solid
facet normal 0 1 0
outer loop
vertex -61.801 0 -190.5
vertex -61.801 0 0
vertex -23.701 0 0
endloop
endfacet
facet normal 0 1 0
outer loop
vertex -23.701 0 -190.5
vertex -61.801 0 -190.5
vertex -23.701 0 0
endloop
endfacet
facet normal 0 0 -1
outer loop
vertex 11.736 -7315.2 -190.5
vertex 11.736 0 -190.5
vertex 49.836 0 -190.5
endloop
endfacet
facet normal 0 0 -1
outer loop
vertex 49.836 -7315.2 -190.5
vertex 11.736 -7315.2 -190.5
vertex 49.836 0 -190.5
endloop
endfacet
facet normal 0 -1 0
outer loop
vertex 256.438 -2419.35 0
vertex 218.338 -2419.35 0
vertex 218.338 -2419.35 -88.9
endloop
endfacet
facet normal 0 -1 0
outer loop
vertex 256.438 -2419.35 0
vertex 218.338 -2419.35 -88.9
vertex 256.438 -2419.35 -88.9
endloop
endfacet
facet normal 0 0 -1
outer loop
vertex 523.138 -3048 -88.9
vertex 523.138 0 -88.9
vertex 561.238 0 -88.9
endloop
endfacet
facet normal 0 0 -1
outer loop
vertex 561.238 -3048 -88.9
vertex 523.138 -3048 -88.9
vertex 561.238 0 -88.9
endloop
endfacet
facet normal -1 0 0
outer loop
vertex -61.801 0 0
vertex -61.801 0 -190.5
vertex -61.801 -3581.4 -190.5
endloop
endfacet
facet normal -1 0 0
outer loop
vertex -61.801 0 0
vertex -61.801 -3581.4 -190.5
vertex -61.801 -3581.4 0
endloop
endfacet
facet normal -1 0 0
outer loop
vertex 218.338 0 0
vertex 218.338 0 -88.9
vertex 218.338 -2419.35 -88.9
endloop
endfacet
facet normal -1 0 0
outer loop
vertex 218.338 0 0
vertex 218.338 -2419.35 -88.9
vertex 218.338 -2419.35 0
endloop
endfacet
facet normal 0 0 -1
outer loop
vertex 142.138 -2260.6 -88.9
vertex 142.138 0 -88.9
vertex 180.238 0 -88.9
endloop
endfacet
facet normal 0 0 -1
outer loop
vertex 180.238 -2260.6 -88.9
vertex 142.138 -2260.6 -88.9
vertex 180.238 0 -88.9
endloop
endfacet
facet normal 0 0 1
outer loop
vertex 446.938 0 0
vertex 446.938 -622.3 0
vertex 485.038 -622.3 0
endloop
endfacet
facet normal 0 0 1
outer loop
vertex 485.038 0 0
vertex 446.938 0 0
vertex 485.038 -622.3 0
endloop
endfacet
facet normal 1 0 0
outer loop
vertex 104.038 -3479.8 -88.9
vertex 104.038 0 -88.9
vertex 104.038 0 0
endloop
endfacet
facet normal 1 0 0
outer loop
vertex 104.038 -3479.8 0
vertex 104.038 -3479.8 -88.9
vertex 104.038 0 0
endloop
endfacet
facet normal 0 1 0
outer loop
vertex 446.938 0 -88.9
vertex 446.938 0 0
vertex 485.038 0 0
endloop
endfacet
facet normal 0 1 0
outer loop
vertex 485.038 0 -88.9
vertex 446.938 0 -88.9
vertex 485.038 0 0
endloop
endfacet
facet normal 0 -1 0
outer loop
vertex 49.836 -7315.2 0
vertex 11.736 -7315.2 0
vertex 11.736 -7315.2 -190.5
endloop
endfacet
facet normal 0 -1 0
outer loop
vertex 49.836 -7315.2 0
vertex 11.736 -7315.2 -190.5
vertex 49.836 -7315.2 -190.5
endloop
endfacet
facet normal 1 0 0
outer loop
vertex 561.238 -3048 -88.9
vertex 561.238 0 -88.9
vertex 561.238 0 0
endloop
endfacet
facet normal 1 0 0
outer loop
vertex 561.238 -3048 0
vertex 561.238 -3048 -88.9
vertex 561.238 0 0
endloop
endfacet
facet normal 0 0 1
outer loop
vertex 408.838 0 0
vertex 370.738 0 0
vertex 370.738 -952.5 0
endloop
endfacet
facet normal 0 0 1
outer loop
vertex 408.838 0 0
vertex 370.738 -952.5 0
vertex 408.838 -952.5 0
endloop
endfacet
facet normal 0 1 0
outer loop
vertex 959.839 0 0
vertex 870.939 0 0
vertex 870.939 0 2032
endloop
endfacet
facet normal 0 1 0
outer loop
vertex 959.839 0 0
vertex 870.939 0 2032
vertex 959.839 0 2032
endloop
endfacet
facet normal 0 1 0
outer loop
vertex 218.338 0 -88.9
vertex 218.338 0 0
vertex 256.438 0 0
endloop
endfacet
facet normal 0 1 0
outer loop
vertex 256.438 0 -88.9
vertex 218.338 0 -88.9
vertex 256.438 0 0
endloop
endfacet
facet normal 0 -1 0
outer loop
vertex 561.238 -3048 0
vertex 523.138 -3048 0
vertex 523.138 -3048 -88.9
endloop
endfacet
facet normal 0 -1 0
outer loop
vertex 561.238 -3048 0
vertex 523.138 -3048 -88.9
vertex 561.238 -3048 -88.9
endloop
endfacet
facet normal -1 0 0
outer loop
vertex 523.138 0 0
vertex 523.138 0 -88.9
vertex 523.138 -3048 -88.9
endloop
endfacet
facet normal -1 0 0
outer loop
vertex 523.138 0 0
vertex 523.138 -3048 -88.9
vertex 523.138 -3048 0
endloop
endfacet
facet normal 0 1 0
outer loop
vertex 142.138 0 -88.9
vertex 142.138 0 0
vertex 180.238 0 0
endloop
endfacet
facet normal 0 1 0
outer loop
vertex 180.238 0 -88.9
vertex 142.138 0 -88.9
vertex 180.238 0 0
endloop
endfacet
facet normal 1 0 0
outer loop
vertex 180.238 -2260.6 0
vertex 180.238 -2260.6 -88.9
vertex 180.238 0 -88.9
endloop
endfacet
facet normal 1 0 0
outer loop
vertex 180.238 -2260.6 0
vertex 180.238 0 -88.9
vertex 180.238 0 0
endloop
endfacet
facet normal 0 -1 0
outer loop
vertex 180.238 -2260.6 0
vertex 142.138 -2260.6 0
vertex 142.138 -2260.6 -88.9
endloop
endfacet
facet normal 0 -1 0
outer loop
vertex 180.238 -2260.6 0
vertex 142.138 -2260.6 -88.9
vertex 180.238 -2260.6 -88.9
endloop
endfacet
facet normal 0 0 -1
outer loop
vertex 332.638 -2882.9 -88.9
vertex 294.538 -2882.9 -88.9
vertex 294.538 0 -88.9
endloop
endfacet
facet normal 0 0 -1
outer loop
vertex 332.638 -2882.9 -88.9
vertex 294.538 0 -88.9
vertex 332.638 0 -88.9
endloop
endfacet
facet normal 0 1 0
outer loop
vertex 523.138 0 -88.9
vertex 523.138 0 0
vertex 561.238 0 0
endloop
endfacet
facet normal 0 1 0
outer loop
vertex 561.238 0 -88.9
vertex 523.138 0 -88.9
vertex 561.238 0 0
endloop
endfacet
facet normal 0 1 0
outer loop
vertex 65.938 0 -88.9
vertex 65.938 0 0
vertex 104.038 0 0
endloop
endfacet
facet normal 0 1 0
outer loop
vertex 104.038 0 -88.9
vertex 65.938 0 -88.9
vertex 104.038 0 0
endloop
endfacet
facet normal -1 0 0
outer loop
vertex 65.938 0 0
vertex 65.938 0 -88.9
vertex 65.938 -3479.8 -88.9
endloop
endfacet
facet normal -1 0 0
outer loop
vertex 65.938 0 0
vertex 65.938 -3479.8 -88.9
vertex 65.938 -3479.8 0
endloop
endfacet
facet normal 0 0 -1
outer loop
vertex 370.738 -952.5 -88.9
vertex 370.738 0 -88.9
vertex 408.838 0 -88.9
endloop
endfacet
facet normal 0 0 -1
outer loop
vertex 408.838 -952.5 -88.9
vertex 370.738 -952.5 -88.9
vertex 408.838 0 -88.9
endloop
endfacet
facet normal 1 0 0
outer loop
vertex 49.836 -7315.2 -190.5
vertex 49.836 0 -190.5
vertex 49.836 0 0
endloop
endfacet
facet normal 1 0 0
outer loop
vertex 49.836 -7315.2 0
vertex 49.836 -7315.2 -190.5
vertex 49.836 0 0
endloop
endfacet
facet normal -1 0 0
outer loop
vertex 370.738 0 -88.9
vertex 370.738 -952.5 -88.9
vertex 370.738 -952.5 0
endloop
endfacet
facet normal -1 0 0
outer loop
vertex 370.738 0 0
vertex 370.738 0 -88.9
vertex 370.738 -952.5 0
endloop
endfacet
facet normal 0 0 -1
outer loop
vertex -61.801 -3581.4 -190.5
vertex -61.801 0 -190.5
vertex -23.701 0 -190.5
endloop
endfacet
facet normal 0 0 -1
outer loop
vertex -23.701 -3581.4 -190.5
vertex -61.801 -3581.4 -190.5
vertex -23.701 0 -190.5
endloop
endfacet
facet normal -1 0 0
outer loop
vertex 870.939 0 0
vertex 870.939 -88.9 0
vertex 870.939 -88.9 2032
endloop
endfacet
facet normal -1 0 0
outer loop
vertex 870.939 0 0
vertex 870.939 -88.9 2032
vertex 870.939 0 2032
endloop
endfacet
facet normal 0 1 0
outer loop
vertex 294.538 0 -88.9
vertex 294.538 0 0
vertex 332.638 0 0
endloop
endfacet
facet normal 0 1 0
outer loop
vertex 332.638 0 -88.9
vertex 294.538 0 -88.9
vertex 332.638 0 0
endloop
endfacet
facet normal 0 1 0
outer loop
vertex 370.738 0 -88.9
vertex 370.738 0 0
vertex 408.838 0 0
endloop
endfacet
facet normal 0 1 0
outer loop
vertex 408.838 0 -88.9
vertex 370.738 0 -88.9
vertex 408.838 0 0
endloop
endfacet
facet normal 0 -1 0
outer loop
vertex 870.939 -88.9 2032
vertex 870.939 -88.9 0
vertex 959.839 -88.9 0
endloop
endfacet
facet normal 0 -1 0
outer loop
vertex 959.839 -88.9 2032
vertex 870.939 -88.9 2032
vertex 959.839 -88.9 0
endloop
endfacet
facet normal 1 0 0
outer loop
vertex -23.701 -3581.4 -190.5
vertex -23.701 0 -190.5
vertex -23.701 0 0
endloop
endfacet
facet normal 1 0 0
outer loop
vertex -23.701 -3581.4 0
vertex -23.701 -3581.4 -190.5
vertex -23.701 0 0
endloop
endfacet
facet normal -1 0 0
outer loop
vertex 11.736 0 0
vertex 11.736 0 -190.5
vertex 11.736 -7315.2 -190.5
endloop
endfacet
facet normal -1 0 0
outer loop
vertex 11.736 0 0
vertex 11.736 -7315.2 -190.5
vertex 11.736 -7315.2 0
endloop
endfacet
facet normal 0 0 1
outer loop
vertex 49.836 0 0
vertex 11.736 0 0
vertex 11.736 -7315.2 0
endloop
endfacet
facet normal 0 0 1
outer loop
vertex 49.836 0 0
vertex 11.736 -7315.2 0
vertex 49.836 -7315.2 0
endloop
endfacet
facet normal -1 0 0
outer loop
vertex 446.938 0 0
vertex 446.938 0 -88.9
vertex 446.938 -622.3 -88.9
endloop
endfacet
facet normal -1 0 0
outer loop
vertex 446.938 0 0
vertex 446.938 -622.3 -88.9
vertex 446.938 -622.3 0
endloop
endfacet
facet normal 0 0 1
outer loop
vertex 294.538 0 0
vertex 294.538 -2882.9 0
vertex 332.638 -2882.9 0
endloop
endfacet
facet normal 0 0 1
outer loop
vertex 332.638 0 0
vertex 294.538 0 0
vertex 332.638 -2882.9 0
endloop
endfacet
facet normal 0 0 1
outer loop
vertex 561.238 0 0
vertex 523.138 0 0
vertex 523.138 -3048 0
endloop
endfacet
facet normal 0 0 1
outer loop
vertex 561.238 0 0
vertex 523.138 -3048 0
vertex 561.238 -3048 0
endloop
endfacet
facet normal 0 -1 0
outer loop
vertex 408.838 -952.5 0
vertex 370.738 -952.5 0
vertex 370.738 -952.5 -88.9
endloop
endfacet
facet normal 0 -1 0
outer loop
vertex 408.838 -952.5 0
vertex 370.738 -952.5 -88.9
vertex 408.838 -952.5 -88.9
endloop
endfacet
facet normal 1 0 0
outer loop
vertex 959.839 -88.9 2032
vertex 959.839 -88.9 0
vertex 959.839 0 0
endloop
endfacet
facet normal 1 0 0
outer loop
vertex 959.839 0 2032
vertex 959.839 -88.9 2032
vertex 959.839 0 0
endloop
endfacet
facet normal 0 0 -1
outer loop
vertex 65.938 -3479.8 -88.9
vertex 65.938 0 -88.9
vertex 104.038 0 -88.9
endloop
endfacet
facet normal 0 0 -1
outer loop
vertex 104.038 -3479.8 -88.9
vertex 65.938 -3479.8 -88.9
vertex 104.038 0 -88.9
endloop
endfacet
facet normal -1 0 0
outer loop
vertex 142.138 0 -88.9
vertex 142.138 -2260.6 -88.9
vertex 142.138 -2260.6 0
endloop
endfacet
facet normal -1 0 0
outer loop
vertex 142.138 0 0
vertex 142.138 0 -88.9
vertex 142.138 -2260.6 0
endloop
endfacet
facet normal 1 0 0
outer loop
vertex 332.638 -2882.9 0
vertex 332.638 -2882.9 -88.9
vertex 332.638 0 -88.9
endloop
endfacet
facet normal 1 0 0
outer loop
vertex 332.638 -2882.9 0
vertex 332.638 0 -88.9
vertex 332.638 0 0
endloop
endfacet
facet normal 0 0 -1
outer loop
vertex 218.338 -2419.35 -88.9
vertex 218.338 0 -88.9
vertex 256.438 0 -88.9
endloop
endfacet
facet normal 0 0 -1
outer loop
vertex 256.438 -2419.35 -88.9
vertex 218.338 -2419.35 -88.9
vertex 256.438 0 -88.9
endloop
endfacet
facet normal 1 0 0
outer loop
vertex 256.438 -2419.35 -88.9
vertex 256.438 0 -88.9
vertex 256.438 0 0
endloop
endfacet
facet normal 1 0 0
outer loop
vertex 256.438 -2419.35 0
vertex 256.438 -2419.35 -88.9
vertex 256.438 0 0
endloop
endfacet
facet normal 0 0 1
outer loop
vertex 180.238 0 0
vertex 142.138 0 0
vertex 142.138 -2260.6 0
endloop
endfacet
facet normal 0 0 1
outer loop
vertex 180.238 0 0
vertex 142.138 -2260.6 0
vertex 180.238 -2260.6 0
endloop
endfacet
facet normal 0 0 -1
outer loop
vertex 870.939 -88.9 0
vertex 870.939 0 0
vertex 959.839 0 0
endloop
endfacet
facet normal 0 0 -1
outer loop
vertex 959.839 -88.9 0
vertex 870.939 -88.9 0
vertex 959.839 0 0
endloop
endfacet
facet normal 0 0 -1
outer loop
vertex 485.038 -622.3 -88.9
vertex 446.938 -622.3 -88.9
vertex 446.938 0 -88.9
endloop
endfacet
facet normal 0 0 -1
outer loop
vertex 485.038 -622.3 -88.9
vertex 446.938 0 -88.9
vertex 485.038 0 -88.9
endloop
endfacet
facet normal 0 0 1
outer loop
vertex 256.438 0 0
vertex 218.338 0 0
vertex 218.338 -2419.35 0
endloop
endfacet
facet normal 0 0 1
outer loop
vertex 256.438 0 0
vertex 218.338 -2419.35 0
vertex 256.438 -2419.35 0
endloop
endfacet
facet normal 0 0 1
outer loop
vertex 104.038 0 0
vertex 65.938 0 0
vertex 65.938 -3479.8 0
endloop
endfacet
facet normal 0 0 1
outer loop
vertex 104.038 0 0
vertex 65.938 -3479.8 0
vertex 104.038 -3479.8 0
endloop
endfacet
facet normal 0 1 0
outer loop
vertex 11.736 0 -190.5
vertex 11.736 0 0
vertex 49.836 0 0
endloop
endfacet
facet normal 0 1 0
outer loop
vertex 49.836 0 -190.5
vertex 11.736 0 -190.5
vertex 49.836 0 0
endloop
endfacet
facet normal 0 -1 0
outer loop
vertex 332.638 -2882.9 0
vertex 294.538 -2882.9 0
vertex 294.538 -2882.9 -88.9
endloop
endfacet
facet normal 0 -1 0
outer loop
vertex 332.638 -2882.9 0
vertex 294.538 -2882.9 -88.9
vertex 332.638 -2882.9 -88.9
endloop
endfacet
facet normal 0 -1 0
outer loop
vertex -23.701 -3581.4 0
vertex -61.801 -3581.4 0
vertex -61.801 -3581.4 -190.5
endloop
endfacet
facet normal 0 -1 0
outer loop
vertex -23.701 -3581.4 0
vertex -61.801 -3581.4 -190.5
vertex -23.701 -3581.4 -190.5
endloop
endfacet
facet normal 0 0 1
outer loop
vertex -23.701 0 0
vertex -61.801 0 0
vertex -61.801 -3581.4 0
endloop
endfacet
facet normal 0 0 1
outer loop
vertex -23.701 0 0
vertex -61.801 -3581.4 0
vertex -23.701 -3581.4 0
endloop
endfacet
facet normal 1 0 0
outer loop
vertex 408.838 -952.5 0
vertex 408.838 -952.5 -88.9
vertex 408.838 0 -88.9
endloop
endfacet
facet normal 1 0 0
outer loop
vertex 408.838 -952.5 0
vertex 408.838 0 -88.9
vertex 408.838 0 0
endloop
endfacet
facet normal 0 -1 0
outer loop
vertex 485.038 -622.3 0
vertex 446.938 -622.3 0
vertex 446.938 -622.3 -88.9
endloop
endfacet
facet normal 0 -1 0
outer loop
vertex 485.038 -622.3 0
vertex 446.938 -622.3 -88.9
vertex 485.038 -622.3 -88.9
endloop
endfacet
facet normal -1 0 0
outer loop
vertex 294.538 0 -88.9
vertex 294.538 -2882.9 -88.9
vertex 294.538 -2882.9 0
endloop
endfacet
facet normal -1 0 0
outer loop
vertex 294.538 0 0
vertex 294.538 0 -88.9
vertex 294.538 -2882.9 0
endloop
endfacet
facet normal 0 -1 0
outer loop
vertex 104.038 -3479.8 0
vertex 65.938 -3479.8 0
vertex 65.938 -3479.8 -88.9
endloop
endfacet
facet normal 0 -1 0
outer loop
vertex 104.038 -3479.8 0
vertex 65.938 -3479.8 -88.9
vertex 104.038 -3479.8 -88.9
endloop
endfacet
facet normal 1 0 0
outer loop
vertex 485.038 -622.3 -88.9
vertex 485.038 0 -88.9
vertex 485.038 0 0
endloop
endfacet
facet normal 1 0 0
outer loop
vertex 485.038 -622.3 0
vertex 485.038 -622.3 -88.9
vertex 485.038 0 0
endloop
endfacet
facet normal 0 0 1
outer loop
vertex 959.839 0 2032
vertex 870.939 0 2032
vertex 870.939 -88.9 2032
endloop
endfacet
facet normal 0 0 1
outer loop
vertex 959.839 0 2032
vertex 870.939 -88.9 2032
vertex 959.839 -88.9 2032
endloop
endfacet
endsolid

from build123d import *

# Parameters (mm, degrees)
F0_W      = 38.1
F0_H      = 190.5
F1_DEPTH  = 3581.4
F2_W      = 38.1
F2_H      = 190.5
F3_DEPTH  = 7315.2
F4_W      = 38.1
F4_H      = 88.9
F5_DEPTH  = 3479.8
F6_DEPTH  = 2260.6
F7_DEPTH  = 2419.35
F8_DEPTH  = 2882.9
F9_DEPTH  = 952.5
F10_DEPTH = 622.3
F11_W     = 88.9
F11_H     = 88.9
F12_DEPTH = 2032
F13_DEPTH = 3048


with BuildPart() as f1:
    # F0 (on Front) → F1 (new body)
    with BuildSketch(Plane.XZ):
        with Locations((-42.75083, -95.25)):
            Rectangle(F0_W, F0_H)
    extrude(amount=F1_DEPTH)


with BuildPart() as f3:
    # F2 (on Front) → F3 (new body)
    with BuildSketch(Plane.XZ):
        with Locations((30.786382, -95.25)):
            Rectangle(F2_W, F2_H)
    extrude(amount=F3_DEPTH)


with BuildPart() as f5:
    # F4 (on Front) → F5 (new body)
    with BuildSketch(Plane.XZ):
        with Locations((84.98819, -44.45)):
            Rectangle(F4_W, F4_H)
    extrude(amount=F5_DEPTH)


with BuildPart() as f6:
    # F4 (on Front) → F6 (new body)
    with BuildSketch(Plane.XZ):
        with Locations((161.18819, -44.45)):
            Rectangle(F4_W, F4_H)
    extrude(amount=F6_DEPTH)


with BuildPart() as f7:
    # F4 (on Front) → F7 (new body)
    with BuildSketch(Plane.XZ):
        with Locations((237.38819, -44.45)):
            Rectangle(F4_W, F4_H)
    extrude(amount=F7_DEPTH)


with BuildPart() as f8:
    # F4 (on Front) → F8 (new body)
    with BuildSketch(Plane.XZ):
        with Locations((313.58819, -44.45)):
            Rectangle(F4_W, F4_H)
    extrude(amount=F8_DEPTH)


with BuildPart() as f9:
    # F4 (on Front) → F9 (new body)
    with BuildSketch(Plane.XZ):
        with Locations((389.78819, -44.45)):
            Rectangle(F4_W, F4_H)
    extrude(amount=F9_DEPTH)


with BuildPart() as f10:
    # F4 (on Front) → F10 (new body)
    with BuildSketch(Plane.XZ):
        with Locations((465.98819, -44.45)):
            Rectangle(F4_W, F4_H)
    extrude(amount=F10_DEPTH)


with BuildPart() as f12:
    # F11 (on Top) → F12 (new body)
    with BuildSketch(Plane.XY):
        with Locations((915.388897, -44.45)):
            Rectangle(F11_W, F11_H)
    extrude(amount=F12_DEPTH)


with BuildPart() as f13:
    # F4 (on Front) → F13 (new body)
    with BuildSketch(Plane.XZ):
        with Locations((542.18819, -44.45)):
            Rectangle(F4_W, F4_H)
    extrude(amount=F13_DEPTH)


solid = Compound([f1.part, f3.part, f5.part, f6.part, f7.part, f8.part, f9.part, f10.part, f12.part, f13.part])
